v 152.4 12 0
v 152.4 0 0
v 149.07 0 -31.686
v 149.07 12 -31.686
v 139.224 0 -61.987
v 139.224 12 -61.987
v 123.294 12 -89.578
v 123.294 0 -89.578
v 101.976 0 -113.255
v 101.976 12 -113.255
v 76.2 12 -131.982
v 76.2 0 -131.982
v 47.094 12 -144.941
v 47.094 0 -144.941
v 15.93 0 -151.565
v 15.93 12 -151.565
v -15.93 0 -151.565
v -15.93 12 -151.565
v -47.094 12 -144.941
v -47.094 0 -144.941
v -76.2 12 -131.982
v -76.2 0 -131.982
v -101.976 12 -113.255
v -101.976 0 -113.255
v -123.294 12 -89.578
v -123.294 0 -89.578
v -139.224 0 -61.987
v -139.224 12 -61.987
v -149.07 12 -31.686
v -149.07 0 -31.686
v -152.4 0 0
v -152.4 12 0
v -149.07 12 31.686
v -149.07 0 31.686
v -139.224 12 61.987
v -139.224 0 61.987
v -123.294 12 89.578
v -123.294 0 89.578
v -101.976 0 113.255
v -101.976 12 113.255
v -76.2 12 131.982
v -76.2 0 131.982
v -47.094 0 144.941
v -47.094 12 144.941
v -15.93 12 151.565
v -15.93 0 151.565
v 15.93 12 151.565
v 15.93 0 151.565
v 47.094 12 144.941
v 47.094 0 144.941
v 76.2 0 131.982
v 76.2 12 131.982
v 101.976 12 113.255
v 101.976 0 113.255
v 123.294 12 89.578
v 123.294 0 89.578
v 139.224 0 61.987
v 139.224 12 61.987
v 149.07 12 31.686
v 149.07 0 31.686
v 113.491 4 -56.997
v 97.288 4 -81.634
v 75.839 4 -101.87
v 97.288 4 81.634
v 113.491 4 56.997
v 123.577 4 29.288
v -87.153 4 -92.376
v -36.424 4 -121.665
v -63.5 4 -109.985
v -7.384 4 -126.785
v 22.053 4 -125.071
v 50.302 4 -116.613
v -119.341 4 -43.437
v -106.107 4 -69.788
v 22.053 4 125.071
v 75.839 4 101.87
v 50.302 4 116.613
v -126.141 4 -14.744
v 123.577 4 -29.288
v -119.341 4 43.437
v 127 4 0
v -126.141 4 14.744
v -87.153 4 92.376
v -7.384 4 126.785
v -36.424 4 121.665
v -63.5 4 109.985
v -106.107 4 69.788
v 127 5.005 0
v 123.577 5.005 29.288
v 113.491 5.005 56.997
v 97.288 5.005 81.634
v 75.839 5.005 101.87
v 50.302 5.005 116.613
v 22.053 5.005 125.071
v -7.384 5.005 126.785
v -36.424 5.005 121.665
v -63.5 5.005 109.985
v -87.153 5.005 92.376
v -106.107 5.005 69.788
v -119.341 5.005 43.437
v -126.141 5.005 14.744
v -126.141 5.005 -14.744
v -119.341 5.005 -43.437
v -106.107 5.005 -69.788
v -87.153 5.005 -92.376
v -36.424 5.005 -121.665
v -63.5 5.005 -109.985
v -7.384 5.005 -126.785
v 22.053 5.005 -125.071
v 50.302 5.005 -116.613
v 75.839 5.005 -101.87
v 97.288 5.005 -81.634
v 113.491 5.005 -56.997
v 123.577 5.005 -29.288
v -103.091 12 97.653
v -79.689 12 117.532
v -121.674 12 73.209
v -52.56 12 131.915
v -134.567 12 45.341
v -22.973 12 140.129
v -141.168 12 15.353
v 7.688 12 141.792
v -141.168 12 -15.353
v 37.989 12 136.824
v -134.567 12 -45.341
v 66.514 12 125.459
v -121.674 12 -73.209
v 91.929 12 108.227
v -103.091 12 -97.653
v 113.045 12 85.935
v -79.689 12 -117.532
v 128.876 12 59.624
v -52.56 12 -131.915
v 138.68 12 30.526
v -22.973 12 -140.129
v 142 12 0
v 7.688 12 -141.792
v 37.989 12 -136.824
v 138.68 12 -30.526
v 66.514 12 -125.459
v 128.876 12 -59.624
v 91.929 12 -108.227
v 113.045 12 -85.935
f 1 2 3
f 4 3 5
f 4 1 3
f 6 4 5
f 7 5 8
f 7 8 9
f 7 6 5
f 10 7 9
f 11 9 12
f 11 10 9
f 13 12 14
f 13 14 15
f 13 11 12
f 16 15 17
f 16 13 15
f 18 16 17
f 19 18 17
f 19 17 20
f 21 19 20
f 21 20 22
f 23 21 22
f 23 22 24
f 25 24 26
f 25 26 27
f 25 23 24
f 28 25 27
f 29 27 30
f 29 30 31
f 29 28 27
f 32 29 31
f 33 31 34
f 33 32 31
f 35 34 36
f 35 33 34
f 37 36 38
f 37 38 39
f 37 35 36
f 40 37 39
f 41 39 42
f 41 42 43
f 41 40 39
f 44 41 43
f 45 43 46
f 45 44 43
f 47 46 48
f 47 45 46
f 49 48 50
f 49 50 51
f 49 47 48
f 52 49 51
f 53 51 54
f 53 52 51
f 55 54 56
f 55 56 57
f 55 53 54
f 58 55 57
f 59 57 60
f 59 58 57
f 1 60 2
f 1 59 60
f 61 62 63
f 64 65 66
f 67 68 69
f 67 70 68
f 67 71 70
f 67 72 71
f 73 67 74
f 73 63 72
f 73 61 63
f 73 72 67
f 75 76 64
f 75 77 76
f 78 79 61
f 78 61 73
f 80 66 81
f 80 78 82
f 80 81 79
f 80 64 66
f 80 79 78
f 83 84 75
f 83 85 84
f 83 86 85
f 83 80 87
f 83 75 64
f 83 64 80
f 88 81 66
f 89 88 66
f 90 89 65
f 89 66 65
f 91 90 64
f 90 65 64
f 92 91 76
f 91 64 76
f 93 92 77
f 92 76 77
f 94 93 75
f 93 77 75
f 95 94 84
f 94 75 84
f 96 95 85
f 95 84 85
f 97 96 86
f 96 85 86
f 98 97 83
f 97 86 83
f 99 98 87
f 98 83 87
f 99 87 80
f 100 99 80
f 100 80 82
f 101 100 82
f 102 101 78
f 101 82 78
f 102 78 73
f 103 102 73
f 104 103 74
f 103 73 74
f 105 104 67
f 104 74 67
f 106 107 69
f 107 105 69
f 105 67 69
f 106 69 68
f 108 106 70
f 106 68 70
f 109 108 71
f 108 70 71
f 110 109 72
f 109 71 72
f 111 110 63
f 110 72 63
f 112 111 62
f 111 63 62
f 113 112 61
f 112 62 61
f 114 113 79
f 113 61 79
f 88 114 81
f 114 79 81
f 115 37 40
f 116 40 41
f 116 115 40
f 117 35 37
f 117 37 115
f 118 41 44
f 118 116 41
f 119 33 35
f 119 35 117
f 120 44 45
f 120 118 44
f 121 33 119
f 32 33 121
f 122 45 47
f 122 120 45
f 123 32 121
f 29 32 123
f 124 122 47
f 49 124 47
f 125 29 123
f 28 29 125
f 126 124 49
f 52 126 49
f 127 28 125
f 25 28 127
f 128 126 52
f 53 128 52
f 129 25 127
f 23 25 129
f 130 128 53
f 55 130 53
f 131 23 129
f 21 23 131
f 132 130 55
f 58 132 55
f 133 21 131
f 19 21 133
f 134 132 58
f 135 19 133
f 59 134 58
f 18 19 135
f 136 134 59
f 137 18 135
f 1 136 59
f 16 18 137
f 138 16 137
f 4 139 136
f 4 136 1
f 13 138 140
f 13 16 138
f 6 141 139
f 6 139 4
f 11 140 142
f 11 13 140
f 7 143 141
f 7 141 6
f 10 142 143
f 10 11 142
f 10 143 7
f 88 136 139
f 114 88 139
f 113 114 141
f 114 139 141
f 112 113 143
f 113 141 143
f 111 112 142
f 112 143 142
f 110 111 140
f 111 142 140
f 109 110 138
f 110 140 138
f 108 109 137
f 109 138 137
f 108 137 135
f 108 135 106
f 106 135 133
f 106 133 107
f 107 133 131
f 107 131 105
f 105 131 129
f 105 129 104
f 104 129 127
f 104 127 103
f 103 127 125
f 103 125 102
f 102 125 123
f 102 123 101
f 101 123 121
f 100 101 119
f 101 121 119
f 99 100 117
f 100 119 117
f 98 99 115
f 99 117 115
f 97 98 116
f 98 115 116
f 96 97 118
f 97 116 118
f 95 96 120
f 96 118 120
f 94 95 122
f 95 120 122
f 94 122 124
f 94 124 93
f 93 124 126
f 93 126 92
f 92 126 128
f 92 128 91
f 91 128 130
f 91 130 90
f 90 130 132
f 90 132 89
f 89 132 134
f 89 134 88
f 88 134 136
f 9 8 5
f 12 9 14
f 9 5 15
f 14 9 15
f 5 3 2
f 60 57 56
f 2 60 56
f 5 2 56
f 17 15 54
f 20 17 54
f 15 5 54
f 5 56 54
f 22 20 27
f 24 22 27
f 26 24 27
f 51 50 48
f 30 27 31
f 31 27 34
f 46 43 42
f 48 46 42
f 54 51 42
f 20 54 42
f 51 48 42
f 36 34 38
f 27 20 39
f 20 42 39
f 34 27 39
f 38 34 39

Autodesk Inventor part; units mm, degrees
ref_plane "YZ Plane" through (0, 0, 0) normal (1, 0, 0) x (0, 1, 0)
ref_plane "XZ Plane" through (0, 0, 0) normal (0, 1, 0) x (-1, 0, 0)
ref_plane "XY Plane" through (0, 0, 0) normal (0, 0, 1) x (1, 0, 0)
sketch "Sketch1" plane through (0, 0, 0) normal (0, 1, 0) x (-1, 0, 0)
  circle A0 centre (0, 0) radius 127
  dimension "d0" = 254
extrude "Extrusion1" add sketch "Sketch1" along normal blind 4
sketch "Sketch2" plane through (0, 4, 0) normal (0, 1, 0) x (1, 0, 0)
  circle A0 centre (0, 0) radius 152.4
  circle A1 centre (0, 0) radius 127 projected
  circle A2 centre (0, 0) radius 127 projected
  dimension "d3" = 304.8
extrude "Extrusion2" add sketch "Sketch2" along normal blind 8 and the other way blind 4
chamfer "Chamfer1" distance 15 angle 25 1 edges at (-127, 12, 0) measured on face at (-143.6873, 12, -2.6061)
properties part number "Placeholder_plate"
